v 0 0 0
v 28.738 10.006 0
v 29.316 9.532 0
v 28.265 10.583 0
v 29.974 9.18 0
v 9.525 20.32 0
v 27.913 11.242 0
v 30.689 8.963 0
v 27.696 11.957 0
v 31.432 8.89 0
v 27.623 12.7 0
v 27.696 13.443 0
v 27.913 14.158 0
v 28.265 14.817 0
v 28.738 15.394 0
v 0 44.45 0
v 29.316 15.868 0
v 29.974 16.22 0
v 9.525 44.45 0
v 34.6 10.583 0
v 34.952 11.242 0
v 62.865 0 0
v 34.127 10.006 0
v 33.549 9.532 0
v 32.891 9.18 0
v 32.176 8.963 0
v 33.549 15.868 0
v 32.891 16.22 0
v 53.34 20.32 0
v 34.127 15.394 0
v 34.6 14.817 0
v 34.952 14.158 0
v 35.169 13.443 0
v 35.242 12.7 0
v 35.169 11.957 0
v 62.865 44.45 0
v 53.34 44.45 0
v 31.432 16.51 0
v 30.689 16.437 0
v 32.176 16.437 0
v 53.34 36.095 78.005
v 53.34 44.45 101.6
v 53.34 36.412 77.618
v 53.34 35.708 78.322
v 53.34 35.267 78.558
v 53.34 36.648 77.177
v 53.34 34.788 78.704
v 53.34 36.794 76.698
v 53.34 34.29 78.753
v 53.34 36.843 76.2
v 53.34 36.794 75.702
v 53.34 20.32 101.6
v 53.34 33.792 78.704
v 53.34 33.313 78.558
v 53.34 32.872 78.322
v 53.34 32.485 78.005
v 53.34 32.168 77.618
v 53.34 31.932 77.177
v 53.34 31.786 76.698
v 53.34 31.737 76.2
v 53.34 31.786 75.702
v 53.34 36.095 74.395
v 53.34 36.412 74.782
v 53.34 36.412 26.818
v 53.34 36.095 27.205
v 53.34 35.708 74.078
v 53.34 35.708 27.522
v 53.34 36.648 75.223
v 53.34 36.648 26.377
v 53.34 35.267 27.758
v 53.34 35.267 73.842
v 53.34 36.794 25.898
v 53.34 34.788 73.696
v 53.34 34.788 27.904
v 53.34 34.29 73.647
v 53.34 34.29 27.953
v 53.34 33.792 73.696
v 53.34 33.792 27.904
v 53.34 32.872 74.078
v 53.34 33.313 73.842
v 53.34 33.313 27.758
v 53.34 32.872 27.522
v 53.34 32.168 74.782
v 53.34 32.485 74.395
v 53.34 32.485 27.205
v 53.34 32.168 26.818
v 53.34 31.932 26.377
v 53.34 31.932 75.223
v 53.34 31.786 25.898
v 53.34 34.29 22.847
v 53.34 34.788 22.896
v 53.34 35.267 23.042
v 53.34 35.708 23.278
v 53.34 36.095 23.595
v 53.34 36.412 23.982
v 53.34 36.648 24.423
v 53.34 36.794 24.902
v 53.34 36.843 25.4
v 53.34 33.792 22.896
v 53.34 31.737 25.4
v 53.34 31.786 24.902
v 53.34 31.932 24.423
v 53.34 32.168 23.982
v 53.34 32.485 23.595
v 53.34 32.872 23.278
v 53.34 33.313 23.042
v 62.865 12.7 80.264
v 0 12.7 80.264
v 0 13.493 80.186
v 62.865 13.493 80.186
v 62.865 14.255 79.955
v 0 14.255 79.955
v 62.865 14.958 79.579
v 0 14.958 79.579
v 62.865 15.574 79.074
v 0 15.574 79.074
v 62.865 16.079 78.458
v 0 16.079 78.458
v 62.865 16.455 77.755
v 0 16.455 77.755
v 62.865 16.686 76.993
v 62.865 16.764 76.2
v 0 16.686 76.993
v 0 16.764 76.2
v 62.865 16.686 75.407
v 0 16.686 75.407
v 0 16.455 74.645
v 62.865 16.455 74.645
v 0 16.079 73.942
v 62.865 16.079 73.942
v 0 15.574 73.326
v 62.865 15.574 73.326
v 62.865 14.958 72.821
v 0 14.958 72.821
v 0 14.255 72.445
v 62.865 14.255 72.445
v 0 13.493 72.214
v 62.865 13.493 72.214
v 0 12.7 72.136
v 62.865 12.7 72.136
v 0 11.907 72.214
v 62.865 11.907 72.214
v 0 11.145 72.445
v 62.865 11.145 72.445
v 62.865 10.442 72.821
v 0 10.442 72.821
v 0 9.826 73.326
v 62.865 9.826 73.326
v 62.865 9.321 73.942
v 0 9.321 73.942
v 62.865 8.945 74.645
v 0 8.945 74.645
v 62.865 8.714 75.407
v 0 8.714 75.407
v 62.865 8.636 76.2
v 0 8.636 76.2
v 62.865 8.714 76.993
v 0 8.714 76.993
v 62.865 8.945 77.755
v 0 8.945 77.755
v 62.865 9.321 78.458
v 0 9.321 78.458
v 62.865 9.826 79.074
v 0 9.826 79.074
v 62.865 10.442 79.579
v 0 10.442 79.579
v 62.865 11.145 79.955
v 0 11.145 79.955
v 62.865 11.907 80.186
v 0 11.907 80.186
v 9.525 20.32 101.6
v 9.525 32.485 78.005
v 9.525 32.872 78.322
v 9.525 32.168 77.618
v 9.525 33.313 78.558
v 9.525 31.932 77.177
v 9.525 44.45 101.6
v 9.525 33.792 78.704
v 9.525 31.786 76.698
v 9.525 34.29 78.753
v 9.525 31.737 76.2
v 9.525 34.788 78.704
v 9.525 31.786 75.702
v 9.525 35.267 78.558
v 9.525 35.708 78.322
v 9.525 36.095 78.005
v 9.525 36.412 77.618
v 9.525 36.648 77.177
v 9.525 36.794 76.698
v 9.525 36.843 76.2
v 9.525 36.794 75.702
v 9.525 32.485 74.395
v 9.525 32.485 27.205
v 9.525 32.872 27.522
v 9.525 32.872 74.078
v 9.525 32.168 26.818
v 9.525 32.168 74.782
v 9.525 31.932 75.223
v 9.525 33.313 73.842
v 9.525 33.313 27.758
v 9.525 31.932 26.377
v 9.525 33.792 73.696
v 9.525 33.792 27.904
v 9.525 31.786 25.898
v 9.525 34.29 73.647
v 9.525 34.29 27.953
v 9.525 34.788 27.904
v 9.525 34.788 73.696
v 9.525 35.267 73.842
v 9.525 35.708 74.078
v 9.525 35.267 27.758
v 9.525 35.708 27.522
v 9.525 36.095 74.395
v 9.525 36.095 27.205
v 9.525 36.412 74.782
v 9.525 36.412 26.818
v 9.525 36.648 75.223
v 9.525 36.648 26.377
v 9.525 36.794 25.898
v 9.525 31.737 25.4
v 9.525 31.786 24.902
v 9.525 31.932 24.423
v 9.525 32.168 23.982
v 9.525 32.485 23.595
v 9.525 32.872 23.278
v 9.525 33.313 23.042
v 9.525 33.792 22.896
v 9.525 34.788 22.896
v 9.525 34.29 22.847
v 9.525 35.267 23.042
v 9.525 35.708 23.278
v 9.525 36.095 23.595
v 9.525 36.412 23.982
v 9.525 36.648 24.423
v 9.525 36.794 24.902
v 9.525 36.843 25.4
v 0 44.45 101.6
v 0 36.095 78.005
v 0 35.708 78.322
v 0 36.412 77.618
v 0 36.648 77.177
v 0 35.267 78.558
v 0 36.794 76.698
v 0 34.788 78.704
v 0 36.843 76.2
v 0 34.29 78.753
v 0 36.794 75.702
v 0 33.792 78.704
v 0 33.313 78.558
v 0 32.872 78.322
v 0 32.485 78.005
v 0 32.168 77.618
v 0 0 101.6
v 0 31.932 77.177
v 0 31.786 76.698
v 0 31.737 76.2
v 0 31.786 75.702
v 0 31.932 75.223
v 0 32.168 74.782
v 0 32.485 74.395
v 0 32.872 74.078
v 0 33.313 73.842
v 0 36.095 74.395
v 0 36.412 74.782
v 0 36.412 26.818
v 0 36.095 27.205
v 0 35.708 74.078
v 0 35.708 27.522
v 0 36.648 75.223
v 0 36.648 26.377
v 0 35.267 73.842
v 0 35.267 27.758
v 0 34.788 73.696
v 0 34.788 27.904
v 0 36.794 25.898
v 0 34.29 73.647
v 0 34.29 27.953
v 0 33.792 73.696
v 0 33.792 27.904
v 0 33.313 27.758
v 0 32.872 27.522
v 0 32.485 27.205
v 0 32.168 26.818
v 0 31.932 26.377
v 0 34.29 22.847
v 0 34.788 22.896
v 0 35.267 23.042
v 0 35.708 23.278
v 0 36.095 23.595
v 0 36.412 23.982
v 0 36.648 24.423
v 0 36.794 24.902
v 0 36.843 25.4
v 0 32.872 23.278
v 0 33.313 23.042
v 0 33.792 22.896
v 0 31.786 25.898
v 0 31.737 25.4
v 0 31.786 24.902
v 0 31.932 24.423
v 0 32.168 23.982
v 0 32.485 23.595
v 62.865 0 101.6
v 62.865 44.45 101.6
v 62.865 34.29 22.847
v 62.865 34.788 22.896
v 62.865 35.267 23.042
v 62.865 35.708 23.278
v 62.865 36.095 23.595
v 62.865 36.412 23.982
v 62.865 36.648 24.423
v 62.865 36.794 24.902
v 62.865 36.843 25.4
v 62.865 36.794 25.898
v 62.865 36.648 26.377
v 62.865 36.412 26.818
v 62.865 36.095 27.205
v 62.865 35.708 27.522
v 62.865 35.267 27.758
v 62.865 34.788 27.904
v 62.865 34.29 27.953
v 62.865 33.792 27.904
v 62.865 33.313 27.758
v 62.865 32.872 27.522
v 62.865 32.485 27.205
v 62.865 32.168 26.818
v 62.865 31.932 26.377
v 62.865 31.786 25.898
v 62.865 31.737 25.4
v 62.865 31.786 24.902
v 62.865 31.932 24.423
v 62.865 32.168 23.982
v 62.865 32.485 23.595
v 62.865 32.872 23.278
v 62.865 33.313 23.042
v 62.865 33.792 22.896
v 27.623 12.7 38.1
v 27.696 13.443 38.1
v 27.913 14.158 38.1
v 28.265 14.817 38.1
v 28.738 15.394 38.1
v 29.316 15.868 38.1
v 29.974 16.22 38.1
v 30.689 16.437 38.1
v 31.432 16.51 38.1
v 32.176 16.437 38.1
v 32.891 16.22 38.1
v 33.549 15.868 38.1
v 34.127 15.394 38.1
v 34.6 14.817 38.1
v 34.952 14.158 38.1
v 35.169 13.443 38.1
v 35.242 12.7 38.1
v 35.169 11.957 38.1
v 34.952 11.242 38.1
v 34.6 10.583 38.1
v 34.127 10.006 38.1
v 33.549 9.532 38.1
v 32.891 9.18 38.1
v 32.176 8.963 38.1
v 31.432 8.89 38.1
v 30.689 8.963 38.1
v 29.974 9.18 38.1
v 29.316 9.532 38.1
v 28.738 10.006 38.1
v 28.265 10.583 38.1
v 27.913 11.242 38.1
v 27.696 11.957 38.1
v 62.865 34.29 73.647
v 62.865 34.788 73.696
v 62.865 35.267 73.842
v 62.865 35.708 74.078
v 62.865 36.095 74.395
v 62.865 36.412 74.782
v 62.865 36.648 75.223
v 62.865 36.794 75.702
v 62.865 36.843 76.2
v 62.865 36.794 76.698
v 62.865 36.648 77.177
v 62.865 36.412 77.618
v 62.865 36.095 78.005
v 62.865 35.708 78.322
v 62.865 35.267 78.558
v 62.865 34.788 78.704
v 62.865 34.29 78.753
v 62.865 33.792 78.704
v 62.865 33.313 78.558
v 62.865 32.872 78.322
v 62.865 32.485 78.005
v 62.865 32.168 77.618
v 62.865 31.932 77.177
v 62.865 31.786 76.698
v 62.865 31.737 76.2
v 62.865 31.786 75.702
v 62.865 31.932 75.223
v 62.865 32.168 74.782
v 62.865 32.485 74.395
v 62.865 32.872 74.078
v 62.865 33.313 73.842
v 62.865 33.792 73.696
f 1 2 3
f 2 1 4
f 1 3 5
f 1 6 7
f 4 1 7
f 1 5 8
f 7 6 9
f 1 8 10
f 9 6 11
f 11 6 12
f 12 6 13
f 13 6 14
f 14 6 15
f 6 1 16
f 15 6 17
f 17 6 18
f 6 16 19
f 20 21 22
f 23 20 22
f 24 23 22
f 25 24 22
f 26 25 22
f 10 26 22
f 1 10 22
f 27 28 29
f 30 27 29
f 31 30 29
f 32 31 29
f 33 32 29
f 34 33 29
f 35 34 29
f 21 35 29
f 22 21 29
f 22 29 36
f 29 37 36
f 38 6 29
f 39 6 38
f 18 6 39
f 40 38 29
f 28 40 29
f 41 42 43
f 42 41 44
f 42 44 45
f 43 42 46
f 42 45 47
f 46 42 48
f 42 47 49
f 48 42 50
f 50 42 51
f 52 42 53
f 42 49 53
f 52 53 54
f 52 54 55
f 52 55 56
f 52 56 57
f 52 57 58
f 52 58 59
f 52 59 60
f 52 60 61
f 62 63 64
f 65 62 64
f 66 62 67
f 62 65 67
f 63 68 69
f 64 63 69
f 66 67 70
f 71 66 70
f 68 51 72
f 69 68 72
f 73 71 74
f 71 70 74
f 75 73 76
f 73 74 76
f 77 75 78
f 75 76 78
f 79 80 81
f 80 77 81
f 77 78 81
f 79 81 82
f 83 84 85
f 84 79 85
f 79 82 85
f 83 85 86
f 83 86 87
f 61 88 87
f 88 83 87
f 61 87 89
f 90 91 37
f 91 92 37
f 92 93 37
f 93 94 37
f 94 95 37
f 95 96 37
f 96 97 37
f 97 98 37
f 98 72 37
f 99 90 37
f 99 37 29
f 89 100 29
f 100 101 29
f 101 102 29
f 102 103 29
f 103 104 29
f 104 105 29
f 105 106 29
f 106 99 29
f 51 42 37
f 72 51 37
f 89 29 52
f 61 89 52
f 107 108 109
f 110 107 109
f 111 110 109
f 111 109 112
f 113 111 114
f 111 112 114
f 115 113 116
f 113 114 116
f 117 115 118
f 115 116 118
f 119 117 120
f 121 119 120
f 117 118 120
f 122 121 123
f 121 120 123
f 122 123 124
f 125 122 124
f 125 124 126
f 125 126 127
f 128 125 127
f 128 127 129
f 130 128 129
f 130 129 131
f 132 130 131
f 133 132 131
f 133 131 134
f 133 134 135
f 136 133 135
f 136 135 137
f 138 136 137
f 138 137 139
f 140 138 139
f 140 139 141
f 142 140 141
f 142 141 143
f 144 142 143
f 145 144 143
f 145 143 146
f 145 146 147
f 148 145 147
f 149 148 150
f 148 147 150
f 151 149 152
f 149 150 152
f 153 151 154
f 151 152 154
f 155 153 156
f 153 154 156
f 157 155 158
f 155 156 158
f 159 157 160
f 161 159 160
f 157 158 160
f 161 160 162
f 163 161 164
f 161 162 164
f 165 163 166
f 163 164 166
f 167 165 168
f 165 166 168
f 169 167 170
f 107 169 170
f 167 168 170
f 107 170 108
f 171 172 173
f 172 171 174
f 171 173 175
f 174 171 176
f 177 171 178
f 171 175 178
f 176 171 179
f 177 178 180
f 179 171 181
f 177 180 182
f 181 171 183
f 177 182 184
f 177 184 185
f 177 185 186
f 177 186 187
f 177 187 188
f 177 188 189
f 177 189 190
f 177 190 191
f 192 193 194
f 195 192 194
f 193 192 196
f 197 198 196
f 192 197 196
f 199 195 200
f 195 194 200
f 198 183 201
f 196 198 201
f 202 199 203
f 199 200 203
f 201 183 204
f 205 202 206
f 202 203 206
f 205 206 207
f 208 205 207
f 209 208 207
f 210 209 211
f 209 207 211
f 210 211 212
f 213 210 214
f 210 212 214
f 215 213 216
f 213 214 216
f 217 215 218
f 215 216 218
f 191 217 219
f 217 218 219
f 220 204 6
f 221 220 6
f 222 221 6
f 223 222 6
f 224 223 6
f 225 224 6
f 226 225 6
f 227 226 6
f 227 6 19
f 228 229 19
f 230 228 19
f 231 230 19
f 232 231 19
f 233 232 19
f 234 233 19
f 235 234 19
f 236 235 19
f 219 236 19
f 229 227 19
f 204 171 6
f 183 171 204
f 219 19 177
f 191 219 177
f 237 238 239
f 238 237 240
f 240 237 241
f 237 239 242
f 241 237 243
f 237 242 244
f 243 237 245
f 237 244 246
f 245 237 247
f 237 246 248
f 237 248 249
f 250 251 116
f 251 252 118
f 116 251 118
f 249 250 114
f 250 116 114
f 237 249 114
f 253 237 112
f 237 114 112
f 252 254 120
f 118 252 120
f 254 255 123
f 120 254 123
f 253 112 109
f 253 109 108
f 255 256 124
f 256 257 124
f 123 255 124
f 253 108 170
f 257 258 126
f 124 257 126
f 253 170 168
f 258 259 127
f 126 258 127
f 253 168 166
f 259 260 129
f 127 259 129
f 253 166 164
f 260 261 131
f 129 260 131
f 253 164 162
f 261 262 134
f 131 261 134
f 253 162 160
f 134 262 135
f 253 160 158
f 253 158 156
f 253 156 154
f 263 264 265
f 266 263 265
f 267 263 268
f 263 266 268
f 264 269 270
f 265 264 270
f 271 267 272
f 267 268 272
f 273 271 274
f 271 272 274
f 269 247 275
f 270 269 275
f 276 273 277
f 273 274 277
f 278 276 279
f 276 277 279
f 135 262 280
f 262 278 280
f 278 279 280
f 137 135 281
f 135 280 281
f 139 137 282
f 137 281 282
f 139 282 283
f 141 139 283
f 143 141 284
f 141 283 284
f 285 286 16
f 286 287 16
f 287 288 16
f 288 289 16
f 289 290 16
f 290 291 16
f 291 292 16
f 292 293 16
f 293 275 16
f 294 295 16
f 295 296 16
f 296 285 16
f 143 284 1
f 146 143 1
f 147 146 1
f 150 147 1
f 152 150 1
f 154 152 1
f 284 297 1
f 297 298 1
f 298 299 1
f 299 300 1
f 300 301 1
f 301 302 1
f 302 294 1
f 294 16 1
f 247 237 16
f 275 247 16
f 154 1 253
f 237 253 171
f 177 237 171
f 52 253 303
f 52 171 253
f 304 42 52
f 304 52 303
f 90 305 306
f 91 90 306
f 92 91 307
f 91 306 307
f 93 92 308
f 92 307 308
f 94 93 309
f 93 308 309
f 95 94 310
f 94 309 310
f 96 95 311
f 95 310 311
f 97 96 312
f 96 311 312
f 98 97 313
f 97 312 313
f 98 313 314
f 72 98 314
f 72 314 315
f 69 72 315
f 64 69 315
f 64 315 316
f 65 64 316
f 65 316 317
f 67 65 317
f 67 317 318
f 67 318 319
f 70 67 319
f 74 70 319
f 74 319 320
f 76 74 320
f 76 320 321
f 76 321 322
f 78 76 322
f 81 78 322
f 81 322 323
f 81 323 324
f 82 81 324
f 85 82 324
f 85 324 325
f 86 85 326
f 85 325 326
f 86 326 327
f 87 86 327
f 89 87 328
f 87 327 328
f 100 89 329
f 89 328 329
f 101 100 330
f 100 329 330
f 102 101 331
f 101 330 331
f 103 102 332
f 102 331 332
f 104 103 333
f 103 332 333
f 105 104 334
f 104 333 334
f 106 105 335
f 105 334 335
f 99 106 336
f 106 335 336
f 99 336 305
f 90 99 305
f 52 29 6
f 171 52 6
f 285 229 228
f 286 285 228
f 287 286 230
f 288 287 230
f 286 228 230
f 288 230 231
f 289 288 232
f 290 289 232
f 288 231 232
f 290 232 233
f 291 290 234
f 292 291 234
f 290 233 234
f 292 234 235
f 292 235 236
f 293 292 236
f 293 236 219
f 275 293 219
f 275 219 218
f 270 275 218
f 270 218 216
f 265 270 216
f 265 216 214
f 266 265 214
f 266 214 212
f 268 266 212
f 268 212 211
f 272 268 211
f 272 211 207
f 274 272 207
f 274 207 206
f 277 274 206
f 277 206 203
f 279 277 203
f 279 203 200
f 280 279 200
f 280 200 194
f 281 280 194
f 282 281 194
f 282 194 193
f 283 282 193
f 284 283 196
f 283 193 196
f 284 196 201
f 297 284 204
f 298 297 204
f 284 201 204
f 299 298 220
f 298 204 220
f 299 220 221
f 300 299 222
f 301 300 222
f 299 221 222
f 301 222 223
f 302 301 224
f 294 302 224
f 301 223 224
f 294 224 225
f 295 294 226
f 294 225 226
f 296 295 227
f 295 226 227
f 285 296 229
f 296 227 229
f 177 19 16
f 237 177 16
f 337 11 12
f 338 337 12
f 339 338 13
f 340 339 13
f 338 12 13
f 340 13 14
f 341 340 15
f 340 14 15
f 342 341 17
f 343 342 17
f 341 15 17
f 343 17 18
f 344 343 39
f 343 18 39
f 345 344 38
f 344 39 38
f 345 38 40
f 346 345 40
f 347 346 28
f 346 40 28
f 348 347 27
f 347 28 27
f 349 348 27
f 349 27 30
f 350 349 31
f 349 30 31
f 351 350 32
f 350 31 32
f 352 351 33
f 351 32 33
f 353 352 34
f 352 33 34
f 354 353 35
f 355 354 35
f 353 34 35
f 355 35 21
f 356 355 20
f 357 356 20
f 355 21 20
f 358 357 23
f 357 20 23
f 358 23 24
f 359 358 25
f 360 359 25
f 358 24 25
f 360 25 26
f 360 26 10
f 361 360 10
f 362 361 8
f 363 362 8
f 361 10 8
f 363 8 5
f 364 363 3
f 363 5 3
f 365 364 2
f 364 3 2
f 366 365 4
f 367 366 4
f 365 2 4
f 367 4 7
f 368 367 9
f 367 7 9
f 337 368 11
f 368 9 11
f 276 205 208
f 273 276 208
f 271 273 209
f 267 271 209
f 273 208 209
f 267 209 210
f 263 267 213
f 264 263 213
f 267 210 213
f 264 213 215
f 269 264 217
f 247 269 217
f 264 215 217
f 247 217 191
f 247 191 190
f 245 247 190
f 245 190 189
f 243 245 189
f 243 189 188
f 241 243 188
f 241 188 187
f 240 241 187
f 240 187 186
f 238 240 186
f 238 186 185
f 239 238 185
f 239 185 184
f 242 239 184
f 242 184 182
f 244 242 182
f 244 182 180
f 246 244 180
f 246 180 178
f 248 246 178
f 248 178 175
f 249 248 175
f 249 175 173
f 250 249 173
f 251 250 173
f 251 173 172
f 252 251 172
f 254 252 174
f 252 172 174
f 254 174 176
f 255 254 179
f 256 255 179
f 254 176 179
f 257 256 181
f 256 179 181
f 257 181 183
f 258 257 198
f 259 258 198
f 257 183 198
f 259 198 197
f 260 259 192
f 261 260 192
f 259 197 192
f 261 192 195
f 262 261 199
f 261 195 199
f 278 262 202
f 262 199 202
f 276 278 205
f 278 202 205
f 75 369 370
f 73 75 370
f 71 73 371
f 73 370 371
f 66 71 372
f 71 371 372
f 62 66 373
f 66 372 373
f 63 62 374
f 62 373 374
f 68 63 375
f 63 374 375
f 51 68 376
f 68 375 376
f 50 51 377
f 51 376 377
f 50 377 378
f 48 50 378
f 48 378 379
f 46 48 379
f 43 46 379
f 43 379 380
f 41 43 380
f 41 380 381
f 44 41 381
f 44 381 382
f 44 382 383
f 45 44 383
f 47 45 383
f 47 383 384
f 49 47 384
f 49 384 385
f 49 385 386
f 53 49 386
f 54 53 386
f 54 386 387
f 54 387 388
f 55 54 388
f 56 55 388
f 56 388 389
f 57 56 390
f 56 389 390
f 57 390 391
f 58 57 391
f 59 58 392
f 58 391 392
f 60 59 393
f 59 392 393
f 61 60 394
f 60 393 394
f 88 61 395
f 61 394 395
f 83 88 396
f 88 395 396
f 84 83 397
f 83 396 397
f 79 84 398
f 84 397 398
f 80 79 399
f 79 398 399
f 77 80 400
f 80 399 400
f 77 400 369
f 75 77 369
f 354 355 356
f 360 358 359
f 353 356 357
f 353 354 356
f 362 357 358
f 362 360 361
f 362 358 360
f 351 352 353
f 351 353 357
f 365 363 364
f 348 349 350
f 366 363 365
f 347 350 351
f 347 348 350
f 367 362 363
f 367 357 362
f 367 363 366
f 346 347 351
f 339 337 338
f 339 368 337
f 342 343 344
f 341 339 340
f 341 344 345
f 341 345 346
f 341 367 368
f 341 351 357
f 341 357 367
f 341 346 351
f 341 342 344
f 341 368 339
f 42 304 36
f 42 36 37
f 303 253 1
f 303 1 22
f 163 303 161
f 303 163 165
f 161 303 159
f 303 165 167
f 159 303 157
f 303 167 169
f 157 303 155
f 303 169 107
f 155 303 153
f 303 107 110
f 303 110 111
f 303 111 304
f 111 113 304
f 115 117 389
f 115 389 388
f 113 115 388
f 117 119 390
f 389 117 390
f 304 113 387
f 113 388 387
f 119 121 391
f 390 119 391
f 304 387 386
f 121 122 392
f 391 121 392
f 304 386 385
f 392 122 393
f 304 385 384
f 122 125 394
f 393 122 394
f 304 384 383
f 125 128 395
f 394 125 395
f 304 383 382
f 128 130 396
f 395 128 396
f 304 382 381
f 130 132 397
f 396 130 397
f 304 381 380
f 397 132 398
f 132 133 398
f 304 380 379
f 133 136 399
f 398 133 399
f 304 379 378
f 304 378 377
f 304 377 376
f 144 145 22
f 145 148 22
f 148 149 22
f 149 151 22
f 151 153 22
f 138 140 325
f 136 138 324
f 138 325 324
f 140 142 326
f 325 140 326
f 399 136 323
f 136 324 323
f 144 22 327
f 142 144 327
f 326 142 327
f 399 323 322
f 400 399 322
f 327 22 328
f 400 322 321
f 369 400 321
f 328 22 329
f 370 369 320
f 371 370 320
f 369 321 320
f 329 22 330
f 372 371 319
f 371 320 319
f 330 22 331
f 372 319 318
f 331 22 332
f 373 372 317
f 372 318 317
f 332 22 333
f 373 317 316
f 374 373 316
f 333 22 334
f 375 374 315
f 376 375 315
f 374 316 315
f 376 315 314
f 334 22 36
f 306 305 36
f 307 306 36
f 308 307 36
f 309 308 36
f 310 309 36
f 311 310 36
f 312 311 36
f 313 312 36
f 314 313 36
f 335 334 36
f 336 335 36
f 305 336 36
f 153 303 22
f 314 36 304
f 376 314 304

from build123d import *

# Parameters (mm, degrees)
BOSS_EXTRUDE1_DEPTH        = 101.6
F_7_0_201_DIAMETER_HOLE1_D = 5.1054
SKETCH5_R                  = 4.064
CUT_EXTRUDE2_DEPTH         = 128.476941935
SKETCH9_R                  = 3.81
CUT_EXTRUDE3_DEPTH         = 38.1


with BuildPart() as part:
    # Sketch1 → Boss-Extrude1 (new body)
    with BuildSketch(Plane.XY):
        Polygon((0, 0), (62.865, 0), (62.865, 44.45), (53.34, 44.45), (53.34, 20.32), (9.525, 20.32), (9.525, 44.45), (0, 44.45), align=None)
    extrude(amount=BOSS_EXTRUDE1_DEPTH)

    # #7 (0.201) Diameter Hole1 (through all)
    with Locations(Plane.ZY):
        with Locations((25.4, 34.29), (76.2, 34.29)):
            Hole(F_7_0_201_DIAMETER_HOLE1_D / 2)

    # Sketch5 → Cut-Extrude2 (cut, through all)
    with BuildSketch(Plane.ZY):
        with Locations((76.2, 12.7)):
            Circle(SKETCH5_R)
    extrude(amount=-CUT_EXTRUDE2_DEPTH, mode=Mode.SUBTRACT)

    # Sketch9 → Cut-Extrude3 (cut)
    with BuildSketch(Plane(origin=(0, 0, 0), x_dir=(-1, 0, 0), z_dir=(0, 0, -1))):
        with Locations((-31.4325, 12.7)):
            Circle(SKETCH9_R)
    extrude(amount=-CUT_EXTRUDE3_DEPTH, mode=Mode.SUBTRACT)


solid = part.part
